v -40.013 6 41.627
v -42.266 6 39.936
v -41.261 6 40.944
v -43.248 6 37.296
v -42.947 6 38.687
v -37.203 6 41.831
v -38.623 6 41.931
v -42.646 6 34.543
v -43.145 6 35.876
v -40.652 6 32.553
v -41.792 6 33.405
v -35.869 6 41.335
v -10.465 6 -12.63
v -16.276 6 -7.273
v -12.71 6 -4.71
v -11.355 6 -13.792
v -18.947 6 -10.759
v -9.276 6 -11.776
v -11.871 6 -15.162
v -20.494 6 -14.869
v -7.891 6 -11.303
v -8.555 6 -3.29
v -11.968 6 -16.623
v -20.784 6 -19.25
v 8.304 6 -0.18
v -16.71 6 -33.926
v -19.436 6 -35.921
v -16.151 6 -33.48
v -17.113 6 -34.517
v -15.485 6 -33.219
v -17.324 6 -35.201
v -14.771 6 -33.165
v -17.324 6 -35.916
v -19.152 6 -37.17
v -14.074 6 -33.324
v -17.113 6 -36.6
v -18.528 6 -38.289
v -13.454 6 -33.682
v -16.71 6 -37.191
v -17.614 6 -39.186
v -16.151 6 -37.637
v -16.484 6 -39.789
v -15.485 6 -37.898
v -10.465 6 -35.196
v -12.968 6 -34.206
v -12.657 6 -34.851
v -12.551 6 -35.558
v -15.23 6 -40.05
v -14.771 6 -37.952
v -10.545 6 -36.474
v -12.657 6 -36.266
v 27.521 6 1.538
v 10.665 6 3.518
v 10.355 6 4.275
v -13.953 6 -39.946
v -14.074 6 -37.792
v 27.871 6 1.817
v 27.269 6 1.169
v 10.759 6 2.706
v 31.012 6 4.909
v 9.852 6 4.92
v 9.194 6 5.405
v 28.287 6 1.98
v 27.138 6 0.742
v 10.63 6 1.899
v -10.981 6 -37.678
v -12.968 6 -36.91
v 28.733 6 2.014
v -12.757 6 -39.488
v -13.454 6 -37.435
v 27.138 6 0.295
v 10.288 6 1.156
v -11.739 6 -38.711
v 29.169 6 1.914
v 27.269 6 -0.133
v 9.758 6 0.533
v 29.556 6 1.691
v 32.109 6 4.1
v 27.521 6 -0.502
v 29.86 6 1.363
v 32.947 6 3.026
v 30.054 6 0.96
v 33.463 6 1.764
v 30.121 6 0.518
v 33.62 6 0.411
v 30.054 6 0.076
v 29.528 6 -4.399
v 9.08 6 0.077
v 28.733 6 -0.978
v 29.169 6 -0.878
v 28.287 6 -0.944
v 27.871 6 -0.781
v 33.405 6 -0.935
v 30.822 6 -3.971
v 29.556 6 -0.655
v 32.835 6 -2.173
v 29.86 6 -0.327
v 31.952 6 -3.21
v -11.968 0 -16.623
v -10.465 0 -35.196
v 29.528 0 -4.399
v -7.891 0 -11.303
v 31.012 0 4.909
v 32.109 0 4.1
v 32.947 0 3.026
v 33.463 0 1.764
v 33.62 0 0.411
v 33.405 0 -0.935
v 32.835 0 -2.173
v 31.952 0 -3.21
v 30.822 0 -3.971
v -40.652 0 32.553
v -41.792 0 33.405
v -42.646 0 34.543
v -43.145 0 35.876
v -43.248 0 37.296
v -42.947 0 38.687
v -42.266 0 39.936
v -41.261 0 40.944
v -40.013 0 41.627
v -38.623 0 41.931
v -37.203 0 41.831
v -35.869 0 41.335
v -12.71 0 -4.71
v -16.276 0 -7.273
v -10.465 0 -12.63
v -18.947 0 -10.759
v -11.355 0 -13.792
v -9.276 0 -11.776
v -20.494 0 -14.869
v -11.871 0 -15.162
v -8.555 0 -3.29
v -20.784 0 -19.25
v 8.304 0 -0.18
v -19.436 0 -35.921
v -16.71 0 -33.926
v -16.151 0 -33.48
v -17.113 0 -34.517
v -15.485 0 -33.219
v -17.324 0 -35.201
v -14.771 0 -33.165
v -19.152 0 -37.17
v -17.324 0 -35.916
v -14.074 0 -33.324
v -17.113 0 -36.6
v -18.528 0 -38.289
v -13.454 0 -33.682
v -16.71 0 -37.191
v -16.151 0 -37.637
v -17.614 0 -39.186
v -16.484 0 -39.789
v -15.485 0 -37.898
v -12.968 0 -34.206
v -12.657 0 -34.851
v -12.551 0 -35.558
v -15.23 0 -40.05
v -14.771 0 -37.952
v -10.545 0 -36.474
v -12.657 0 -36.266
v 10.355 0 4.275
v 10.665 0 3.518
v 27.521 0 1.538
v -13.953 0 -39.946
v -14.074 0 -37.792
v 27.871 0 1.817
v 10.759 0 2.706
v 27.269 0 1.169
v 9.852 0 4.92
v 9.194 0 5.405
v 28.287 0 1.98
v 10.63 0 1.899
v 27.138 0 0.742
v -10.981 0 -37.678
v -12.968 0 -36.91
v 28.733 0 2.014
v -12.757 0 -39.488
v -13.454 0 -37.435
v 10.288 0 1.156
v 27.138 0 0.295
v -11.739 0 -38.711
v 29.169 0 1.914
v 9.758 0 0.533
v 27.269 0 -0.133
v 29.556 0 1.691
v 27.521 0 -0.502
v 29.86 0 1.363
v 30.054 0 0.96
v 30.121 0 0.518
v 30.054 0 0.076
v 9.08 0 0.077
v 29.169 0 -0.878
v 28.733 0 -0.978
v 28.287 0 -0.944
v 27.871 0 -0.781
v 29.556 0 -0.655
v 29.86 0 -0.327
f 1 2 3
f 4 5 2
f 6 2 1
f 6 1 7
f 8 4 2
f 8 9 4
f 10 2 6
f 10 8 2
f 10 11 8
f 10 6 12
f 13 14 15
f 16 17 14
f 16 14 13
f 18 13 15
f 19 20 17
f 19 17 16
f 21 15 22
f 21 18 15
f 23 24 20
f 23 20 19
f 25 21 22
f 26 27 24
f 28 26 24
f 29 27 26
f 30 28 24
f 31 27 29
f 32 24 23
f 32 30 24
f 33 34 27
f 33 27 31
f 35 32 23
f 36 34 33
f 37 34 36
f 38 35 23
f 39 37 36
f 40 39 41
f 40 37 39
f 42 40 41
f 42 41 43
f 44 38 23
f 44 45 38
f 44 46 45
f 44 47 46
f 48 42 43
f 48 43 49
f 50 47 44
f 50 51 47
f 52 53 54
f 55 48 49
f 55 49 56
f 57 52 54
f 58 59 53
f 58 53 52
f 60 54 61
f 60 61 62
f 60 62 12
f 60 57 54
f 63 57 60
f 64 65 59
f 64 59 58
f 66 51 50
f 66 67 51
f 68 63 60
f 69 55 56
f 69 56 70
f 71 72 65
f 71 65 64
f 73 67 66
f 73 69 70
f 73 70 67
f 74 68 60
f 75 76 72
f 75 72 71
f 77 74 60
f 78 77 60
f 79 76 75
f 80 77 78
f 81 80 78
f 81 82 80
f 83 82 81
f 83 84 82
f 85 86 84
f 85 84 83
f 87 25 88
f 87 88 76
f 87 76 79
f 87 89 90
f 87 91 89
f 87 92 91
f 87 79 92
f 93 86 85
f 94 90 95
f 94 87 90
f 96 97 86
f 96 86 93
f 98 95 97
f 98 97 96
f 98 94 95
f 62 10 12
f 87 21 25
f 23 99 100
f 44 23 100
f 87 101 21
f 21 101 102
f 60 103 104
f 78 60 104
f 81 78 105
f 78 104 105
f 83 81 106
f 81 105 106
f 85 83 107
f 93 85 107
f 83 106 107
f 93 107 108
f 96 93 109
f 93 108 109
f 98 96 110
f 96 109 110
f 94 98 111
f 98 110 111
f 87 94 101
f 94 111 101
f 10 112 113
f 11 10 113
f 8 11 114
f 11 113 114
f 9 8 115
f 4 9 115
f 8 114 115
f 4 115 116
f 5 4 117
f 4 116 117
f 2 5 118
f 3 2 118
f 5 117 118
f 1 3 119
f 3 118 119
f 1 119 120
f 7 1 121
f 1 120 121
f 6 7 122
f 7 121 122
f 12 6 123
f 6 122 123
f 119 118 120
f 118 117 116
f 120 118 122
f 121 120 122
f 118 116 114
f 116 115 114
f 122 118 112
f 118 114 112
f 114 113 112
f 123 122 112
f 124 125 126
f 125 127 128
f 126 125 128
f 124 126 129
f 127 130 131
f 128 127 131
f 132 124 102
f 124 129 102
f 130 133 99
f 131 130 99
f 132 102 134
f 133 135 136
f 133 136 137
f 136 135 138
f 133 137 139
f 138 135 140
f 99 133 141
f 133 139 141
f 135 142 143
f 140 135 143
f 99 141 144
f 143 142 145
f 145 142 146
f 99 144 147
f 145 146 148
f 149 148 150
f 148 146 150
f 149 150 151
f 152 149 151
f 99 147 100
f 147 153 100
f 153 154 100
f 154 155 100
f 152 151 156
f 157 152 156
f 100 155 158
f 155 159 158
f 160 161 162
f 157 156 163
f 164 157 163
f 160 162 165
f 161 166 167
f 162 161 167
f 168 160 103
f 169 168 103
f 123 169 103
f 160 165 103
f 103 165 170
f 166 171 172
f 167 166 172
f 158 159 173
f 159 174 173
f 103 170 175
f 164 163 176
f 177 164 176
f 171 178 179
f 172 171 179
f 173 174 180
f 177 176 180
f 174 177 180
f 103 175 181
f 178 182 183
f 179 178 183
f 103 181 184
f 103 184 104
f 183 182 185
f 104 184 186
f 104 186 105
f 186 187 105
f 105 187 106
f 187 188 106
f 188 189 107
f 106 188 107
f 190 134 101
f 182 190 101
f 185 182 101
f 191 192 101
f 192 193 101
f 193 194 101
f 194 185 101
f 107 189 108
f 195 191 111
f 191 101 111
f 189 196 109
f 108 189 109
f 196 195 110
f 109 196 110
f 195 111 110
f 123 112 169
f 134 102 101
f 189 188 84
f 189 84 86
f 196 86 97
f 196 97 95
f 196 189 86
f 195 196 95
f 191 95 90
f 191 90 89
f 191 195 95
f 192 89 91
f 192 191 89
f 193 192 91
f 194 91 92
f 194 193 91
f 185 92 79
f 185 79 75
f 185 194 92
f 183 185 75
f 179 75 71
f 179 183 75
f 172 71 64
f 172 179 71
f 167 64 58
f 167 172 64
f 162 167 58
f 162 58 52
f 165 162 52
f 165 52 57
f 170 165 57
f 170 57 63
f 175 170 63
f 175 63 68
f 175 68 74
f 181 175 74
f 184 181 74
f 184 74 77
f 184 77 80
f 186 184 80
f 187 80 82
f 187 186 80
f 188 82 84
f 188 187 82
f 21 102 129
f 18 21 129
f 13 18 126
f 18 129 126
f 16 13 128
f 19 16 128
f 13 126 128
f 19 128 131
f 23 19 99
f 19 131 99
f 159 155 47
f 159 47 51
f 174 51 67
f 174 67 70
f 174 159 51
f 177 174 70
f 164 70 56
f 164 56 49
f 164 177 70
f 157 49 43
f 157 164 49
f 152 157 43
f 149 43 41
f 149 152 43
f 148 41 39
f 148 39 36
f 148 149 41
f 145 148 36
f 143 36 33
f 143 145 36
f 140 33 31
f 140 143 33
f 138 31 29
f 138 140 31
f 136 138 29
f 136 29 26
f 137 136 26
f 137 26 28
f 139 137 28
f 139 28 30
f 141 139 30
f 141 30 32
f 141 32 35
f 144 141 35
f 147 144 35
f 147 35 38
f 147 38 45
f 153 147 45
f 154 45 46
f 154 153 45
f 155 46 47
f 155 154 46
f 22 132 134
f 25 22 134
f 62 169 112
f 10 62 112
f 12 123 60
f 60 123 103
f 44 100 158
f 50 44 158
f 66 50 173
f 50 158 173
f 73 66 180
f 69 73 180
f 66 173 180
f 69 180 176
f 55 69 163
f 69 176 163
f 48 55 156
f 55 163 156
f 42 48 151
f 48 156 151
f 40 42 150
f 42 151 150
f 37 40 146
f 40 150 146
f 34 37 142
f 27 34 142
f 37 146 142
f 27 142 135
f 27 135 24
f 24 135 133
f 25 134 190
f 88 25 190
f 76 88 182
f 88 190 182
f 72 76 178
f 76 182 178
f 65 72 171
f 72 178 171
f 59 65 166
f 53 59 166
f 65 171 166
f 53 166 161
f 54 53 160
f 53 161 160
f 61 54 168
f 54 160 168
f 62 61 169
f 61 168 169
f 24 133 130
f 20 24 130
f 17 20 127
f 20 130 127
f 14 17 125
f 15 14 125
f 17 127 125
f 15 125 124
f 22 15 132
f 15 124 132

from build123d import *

# Parameters (mm, degrees)
SKETCH1_R           = 1.5
SKETCH1_R_2         = 2.4
BOSS_EXTRUDE1_DEPTH = 6


with BuildPart() as part:
    # Sketch1 → Boss-Extrude1 (new body)
    with BuildSketch(Plane(origin=(0, 0, 0), x_dir=(1, 0, 0), z_dir=(0, 1, 0))):
        with BuildLine():
            Line((-19.436129881, 35.921169676), (-20.784472899, 19.250484474))
            ThreePointArc((-20.784472899, 19.250484474), (-17.739772521, 8.917849876), (-8.554847577, 3.290177898))
            Line((-8.554847577, 3.290177898), (8.303819749, 0.179771806))
            ThreePointArc((8.303819749, 0.179771806), (10.722077148, -2.298002723), (9.194413259, -5.405023565))
            Line((9.194413259, -5.405023565), (-40.652031907, -32.553428604))
            ThreePointArc((-40.652031907, -32.553428604), (-42.651504917, -39.335913966), (-35.869019555, -41.335386976))
            Line((-35.869019555, -41.335386976), (31.012382829, -4.909050143))
            ThreePointArc((31.012382829, -4.909050143), (33.55848931, 0.269317926), (29.528060312, 4.398942141))
            Line((29.528060312, 4.398942141), (-7.891068482, 11.302731386))
            ThreePointArc((-7.891068482, 11.302731386), (-10.95271013, 13.178622045), (-11.967610256, 16.622833578))
            Line((-11.967610256, 16.622833578), (-10.465424103, 35.195609308))
            ThreePointArc((-10.465424103, 35.195609308), (-14.587996808, 40.043742381), (-19.436129881, 35.921169676))
        make_face()
        with Locations((28.620876654, -0.518070957)):
            Circle(SKETCH1_R, mode=Mode.SUBTRACT)
        with Locations((-14.950776992, 35.558389492)):
            Circle(SKETCH1_R_2, mode=Mode.SUBTRACT)
    extrude(amount=BOSS_EXTRUDE1_DEPTH)


solid = part.part
